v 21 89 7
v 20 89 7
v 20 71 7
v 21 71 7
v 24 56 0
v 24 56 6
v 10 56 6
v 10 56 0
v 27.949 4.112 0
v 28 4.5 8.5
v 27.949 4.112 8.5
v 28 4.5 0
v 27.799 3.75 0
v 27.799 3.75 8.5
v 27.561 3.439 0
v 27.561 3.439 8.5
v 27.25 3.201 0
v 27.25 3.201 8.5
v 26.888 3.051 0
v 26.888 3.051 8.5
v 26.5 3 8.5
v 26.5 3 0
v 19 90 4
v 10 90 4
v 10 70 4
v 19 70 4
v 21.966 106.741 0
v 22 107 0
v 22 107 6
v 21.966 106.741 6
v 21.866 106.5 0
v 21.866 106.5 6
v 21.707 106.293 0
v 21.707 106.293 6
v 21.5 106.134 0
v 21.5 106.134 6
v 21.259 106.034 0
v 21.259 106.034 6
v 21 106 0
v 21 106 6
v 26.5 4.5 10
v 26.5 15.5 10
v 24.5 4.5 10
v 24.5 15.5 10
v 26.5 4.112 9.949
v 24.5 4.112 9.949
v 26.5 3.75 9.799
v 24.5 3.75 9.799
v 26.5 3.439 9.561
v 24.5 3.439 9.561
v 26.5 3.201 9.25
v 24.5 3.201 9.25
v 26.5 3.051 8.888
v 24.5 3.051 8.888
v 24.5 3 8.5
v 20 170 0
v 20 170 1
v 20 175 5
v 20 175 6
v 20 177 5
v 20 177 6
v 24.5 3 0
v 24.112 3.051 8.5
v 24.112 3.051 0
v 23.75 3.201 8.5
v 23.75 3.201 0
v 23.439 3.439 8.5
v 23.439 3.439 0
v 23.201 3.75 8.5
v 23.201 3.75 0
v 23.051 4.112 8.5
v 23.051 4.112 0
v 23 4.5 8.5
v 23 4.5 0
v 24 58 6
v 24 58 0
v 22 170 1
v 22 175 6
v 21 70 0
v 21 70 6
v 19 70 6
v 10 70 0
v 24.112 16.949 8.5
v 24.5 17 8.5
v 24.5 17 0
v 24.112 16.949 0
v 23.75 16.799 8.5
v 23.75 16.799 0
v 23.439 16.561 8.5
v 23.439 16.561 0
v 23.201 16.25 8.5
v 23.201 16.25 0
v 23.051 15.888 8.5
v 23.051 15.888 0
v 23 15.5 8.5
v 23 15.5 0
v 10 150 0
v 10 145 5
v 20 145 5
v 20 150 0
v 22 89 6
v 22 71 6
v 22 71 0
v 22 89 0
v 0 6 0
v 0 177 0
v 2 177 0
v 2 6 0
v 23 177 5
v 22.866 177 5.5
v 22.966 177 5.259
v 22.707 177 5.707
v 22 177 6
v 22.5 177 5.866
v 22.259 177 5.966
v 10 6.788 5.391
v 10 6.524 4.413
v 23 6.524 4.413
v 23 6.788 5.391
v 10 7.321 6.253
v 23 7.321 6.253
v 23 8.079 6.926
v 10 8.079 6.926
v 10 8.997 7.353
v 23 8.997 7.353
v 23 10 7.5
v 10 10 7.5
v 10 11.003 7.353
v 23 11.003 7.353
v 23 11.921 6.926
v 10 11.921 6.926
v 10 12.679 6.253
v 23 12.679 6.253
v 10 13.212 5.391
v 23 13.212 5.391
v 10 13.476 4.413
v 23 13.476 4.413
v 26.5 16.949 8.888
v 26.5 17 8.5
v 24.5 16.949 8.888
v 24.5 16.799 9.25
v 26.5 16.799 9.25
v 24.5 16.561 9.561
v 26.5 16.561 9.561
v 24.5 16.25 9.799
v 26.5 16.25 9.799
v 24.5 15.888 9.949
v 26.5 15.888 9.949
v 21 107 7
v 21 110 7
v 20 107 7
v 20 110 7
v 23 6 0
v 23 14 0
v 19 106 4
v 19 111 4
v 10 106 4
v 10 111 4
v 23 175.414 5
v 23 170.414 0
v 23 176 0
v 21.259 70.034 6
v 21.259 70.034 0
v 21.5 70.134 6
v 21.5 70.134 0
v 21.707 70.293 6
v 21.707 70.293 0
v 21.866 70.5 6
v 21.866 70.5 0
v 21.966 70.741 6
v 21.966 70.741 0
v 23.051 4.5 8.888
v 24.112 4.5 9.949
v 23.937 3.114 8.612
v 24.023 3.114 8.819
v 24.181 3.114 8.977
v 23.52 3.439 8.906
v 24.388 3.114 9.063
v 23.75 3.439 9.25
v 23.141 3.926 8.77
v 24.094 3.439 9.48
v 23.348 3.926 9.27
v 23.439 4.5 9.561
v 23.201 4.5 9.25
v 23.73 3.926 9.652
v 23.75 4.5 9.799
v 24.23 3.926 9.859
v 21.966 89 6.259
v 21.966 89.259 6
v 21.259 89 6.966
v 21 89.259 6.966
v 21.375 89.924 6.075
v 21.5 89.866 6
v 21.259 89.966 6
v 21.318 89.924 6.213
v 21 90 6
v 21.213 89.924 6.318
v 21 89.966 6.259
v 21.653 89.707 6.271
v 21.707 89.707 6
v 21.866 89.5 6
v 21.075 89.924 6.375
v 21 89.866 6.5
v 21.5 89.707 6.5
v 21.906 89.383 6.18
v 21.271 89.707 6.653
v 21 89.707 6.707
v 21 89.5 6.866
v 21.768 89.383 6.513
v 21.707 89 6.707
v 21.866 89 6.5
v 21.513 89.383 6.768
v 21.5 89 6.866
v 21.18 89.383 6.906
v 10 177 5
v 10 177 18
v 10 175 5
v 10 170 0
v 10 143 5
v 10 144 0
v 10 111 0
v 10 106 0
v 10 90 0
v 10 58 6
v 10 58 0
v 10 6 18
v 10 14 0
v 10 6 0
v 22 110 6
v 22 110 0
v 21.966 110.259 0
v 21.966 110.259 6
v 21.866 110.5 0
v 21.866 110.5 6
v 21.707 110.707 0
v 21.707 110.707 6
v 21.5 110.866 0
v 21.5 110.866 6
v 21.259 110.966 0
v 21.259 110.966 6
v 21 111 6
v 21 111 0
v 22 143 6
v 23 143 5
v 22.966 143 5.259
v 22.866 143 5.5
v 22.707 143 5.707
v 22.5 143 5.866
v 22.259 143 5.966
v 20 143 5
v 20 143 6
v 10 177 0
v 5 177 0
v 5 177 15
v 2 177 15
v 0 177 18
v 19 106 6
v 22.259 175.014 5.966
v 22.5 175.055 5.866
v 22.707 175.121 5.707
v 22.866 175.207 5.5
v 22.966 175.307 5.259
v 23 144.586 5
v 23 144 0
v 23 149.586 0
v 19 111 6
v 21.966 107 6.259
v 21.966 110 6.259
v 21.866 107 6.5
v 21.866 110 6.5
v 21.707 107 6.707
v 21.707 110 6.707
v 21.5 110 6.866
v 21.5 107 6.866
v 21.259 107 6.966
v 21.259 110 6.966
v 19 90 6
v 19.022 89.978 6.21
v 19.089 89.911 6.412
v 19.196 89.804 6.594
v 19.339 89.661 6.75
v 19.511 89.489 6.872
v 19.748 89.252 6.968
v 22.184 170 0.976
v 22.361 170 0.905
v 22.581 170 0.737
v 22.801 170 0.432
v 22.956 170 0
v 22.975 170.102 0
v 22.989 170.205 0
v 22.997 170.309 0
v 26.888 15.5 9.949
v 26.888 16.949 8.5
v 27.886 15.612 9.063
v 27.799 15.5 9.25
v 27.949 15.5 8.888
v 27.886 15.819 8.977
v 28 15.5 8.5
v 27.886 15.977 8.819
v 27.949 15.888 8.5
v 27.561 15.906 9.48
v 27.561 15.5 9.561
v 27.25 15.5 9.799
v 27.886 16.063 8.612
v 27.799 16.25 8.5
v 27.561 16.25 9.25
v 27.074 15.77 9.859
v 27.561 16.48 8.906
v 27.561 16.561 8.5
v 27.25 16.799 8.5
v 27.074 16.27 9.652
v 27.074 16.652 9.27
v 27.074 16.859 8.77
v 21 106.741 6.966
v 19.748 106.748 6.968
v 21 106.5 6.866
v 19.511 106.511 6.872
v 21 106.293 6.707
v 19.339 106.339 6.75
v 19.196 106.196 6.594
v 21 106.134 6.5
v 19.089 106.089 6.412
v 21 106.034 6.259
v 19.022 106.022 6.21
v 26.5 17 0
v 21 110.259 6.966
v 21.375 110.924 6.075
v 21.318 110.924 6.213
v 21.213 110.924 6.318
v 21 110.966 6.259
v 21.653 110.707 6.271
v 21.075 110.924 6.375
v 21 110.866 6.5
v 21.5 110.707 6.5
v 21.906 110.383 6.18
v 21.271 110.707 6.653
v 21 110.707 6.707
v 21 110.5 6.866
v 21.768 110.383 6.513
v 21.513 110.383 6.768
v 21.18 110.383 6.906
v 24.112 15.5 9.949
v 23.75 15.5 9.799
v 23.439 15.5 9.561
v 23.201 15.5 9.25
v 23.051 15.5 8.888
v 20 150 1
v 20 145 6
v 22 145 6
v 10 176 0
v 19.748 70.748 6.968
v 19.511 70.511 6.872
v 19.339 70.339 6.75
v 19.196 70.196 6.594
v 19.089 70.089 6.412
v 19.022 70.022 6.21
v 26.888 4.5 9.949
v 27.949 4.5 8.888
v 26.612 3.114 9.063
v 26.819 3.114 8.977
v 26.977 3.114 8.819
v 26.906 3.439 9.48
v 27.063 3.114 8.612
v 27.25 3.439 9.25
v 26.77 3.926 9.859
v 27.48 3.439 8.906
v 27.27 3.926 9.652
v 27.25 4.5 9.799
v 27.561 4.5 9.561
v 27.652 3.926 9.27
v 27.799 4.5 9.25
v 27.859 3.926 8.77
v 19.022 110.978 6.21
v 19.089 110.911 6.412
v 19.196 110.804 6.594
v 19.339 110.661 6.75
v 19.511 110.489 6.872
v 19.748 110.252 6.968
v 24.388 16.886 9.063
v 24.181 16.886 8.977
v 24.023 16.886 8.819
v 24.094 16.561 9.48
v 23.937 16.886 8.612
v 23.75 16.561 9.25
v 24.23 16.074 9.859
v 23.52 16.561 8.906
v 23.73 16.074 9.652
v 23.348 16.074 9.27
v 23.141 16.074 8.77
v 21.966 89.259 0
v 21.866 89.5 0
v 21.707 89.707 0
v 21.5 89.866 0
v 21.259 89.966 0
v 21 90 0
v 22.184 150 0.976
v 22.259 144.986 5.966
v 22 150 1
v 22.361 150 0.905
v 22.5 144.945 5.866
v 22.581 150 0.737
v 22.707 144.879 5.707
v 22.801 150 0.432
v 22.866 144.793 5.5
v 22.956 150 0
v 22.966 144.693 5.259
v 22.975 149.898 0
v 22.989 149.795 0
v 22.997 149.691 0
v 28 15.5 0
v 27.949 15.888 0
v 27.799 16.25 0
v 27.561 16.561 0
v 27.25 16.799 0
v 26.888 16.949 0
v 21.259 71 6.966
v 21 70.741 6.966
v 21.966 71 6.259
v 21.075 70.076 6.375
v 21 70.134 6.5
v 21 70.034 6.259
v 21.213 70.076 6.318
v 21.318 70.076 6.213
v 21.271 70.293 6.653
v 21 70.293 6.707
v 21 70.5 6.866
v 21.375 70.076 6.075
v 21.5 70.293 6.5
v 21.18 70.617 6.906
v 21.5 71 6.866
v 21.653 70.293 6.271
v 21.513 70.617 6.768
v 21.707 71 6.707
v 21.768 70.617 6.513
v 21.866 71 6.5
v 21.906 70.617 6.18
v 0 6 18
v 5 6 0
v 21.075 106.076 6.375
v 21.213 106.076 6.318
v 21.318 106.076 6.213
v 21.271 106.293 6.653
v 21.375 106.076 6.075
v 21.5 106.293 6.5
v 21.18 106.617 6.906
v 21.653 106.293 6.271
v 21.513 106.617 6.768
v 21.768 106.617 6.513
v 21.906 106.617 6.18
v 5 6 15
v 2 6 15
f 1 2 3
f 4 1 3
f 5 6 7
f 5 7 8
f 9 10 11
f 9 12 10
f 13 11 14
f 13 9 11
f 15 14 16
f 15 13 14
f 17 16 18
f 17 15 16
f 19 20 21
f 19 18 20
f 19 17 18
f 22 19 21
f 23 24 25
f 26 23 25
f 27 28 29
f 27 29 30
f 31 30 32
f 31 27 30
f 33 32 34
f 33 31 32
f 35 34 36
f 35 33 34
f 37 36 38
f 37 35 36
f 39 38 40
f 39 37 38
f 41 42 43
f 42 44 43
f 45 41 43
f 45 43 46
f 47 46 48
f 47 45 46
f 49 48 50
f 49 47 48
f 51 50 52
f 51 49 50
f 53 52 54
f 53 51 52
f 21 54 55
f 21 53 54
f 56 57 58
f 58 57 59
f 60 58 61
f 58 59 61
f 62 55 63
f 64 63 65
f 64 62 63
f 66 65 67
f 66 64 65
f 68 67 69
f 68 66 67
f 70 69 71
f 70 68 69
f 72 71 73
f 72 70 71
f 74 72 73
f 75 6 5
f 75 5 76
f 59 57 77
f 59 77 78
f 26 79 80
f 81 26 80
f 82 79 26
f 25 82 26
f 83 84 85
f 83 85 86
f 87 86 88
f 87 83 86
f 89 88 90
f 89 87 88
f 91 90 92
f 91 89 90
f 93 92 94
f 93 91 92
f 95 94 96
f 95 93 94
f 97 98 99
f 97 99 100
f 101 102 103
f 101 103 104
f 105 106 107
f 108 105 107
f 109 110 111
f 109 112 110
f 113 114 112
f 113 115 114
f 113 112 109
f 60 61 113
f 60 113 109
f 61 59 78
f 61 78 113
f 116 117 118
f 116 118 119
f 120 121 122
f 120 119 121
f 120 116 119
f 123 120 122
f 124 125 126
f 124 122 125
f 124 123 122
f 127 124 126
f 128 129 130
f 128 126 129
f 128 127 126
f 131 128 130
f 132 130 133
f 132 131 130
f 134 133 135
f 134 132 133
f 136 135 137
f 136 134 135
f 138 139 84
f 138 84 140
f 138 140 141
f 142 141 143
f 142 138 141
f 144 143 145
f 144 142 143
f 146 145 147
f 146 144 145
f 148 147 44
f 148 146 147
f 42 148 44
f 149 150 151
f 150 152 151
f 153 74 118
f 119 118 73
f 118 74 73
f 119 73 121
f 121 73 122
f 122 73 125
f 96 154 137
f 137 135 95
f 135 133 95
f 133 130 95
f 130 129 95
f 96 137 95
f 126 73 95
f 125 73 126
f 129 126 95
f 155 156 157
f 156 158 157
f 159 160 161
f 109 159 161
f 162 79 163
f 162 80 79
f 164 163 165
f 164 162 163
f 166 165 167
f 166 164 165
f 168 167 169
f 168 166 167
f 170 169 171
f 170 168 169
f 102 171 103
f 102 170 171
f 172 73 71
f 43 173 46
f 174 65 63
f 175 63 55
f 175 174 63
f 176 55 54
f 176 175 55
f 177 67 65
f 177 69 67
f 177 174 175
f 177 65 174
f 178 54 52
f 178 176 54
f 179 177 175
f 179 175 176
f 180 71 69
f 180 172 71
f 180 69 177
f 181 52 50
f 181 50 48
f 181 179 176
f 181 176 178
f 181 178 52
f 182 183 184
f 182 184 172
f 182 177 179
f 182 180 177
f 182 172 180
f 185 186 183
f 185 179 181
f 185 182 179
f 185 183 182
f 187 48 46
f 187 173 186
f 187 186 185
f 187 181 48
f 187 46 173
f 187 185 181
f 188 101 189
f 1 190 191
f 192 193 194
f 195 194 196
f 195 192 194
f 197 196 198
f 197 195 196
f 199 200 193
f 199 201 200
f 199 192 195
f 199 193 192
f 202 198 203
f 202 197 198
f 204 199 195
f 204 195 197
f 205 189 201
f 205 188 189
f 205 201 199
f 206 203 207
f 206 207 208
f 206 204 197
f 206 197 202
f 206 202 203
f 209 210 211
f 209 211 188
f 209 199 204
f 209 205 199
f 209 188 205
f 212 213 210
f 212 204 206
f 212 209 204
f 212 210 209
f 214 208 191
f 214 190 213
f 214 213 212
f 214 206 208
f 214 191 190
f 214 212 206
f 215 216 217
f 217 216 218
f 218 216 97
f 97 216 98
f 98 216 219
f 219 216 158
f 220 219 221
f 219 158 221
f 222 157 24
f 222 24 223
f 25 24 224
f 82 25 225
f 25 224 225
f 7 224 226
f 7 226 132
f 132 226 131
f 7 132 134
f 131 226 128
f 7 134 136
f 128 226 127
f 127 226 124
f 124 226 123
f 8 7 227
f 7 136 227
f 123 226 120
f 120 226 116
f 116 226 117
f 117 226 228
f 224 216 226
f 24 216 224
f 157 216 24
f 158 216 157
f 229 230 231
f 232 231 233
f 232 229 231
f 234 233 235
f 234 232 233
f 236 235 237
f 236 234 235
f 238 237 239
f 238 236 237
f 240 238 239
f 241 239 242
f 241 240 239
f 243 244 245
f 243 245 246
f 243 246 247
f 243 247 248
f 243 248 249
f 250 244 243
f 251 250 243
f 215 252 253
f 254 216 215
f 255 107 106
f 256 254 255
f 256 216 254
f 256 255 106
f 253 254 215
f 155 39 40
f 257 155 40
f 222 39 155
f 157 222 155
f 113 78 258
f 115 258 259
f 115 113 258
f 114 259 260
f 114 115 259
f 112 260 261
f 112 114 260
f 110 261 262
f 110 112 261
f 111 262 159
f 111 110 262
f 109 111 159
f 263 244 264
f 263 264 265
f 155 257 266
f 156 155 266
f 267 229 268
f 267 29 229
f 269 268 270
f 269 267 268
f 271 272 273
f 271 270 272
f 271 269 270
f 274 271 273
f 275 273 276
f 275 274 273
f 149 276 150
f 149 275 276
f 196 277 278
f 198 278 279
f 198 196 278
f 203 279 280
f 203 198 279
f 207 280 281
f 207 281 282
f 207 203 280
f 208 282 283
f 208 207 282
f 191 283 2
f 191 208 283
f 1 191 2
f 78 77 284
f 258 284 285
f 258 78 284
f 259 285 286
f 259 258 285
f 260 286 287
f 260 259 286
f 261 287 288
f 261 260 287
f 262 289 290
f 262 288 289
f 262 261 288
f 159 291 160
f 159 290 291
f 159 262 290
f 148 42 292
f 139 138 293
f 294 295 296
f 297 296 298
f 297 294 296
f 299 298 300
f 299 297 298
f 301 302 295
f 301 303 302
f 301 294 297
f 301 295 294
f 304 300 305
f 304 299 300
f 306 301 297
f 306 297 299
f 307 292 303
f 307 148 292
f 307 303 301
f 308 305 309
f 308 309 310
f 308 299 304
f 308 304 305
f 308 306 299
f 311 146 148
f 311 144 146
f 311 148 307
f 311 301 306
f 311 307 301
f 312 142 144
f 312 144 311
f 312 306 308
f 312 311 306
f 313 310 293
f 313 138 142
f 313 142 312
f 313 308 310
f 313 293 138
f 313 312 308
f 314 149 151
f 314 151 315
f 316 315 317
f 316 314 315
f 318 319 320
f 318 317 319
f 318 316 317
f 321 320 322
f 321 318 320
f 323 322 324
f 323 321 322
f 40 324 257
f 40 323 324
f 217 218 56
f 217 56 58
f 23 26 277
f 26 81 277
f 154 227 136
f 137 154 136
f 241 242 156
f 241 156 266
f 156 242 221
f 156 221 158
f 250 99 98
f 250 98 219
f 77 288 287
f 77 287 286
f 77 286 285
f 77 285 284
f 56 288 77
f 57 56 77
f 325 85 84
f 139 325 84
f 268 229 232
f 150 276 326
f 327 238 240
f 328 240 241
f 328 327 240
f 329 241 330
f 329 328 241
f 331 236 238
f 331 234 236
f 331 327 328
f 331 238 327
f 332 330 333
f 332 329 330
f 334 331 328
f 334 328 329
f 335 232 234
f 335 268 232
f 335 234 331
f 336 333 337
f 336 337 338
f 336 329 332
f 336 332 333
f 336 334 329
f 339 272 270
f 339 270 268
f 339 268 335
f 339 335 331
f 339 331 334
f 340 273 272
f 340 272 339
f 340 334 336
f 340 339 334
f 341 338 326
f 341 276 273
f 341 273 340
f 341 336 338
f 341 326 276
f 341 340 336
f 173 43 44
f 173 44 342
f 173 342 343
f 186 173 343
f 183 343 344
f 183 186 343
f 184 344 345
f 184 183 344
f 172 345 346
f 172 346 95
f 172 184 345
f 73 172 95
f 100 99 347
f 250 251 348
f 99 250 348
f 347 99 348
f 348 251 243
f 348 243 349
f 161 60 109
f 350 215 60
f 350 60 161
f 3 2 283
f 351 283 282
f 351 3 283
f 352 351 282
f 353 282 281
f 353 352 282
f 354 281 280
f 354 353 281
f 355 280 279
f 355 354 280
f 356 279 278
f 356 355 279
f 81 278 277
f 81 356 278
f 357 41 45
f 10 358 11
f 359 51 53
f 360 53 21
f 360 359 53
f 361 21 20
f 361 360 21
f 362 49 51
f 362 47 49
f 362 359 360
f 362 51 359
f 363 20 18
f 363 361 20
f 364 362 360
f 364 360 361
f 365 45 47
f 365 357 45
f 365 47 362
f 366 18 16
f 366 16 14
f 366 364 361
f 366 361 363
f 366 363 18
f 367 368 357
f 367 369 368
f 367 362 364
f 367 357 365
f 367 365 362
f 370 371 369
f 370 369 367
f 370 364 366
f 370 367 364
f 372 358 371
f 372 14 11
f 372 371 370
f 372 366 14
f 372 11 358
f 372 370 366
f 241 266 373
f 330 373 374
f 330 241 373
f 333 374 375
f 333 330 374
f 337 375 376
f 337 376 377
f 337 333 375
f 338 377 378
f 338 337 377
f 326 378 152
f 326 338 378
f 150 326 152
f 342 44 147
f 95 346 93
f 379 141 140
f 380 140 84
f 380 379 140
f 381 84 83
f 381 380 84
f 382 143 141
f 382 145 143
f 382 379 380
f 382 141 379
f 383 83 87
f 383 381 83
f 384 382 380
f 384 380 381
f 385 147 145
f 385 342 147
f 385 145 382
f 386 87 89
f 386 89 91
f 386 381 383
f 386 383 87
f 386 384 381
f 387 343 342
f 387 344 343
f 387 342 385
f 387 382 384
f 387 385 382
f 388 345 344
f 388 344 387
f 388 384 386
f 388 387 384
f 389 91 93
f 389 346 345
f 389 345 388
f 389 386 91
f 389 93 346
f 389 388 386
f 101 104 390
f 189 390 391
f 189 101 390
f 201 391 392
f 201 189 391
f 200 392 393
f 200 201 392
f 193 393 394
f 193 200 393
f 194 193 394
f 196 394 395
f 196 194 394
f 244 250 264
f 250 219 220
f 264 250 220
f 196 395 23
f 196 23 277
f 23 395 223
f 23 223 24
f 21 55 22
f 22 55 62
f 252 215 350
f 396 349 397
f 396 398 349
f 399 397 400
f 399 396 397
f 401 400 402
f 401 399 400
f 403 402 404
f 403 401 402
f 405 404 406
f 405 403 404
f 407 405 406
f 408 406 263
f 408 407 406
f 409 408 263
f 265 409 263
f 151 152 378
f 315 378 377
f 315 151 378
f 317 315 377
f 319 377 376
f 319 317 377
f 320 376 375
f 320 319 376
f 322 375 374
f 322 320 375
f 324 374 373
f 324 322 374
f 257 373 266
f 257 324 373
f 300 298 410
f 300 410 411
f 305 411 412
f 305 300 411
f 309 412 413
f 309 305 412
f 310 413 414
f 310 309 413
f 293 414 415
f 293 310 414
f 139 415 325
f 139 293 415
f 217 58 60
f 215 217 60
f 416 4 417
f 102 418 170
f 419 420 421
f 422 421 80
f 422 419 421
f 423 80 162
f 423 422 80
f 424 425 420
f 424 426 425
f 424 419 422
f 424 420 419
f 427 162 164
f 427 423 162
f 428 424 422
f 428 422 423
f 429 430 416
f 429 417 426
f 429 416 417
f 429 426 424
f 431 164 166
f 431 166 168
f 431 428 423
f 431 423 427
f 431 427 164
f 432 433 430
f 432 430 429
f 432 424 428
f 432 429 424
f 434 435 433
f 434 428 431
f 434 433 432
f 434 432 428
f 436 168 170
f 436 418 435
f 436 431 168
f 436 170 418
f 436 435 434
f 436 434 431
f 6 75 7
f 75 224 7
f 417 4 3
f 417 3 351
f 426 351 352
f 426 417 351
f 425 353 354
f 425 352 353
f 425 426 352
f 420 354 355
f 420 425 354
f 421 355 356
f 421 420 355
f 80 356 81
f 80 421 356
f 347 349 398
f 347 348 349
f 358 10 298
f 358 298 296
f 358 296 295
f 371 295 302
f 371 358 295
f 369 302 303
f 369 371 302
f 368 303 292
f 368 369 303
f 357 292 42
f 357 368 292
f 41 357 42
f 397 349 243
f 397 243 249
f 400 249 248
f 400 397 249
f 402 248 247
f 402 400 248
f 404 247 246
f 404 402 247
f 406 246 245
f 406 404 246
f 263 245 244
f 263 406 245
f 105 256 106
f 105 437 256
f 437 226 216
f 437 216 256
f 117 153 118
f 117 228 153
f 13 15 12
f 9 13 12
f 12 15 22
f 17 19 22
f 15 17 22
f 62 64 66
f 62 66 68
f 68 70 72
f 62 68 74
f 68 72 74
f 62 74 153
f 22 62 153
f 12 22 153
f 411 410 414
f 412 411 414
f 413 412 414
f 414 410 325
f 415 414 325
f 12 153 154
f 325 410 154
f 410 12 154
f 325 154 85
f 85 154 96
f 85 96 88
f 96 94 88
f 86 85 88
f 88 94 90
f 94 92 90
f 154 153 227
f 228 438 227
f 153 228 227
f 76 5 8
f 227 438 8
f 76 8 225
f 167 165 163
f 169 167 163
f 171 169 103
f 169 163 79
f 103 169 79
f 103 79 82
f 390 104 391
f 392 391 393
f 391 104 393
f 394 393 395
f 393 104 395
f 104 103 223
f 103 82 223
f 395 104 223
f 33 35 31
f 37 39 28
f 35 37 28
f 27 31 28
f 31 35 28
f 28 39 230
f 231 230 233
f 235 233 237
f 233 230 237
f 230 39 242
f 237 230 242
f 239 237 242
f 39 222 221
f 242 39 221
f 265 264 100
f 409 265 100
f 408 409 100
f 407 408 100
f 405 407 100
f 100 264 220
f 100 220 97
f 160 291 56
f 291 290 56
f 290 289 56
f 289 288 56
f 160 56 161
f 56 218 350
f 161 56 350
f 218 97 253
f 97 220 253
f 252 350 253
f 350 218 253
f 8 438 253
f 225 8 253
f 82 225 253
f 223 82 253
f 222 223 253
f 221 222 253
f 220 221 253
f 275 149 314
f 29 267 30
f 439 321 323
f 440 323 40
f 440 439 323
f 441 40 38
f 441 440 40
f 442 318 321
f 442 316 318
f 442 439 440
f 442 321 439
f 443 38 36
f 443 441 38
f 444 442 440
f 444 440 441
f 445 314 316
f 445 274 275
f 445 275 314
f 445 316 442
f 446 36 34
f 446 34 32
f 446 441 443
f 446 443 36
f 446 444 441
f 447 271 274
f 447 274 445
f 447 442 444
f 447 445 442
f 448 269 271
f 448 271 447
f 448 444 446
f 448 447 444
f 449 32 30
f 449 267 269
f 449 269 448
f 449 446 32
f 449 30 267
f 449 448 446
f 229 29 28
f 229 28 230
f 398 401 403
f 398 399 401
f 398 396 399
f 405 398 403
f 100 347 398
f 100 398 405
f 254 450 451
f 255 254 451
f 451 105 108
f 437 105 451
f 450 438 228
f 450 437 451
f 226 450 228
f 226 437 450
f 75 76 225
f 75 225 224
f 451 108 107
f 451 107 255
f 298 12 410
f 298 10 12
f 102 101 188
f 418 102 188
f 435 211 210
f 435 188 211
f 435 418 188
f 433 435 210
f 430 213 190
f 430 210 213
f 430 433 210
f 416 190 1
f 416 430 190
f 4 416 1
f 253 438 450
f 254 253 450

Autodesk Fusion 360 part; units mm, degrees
sketch "Schizzo2" plane through (0, 0, 0) normal (0, 1, 0) x (1, 0, 0)
  line L0 (0, 0) -> (2, 0)
  line L1 (2, 0) -> (2, -30)
  line L2 (2, -30) -> (0, -30)
  line L3 (0, -30) -> (0, 0)
  line L4 (2, -30) -> (5, -30)
  line L5 (5, -30) -> (5, -15)
  line L6 (5, -15) -> (2, -15)
  line L7 (2, -15) -> (2, -30)
  line L8 (5, -30) -> (10, -30)
  line L9 (10, -30) -> (10, 0)
  line L10 (10, 0) -> (5, 0)
  line L11 (5, 0) -> (5, -30)
  dimension "d1" = 2
  dimension "d2" = 30
  dimension "d3" = 3
  dimension "d4" = 30
  dimension "d5" = 5
  dimension "d44" = 15
extrude "Estrusione1" add sketch "Schizzo2" along normal blind 200
sketch "Schizzo3" plane through (10, 0, 0) normal (1, 0, 0) x (0, 1, 0)
  line L0 (0, 30) -> (0, 0)
  line L1 (0, 0) -> (200, 0)
  line L2 (200, 0) -> (200, 30)
  line L3 (200, 30) -> (0, 30)
  line L4 (0, 30) -> (10, 30)
  circle A0 centre (10, 4) radius 3.5
  line L5 (6, 0) -> (6.5245, 4.413)
  line L6 (14, 0) -> (13.4755, 4.413)
  line L7 (6, 0) -> (14, 0)
  dimension "d8" = 7
extrude "Estrusione2" add sketch "Schizzo3" along normal blind 13 contours L1 A0 L5 L6 L7 | A0
sketch "Schizzo4" plane through (23, 0, 0) normal (1, 0, 0) x (0, 1, 0)
  line L0 (3, 0) -> (17, 0)
  line L1 (17, 0) -> (17, 10)
  line L2 (17, 10) -> (3, 10)
  line L3 (3, 10) -> (3, 0)
extrude "Estrusione4" add sketch "Schizzo4" along normal blind 5
fillet "Raccordo3" radius 1.5 8 edges at (23, 10, 10) (25.5, 17, 10) (28, 10, 10) (25.5, 3, 10) (28, 3, 5) (23, 3, 5) (28, 17, 5) (23, 17, 5)
sketch "Schizzo5" plane through (10, 0, 0) normal (1, 0, 0) x (0, 1, 0)
  line L0 (13.4755, 4.413) -> (14, 0)
  line L1 (14, 0) -> (200, 0)
  line L2 (200, 0) -> (200, 30)
  line L3 (200, 30) -> (0, 30)
  line L4 (0, 30) -> (0, 0)
  line L5 (0, 0) -> (6, 0)
  line L6 (6, 0) -> (6.5245, 4.413)
  arc A0 (13.4755, 4.413) -> (6.5245, 4.413) centre (10, 4) ccw
sketch "Schizzo6" plane through (10, 0, 0) normal (1, 0, 0) x (0, 1, 0)
  line L0 (70, 0) -> (70, 4)
  line L1 (70, 0) -> (90, 0)
  line L2 (90, 0) -> (106, 0)
  line L3 (106, 0) -> (111, 0)
  line L4 (111, 0) -> (111, 4)
  line L5 (90, 0) -> (90, 4)
  line L6 (106, 0) -> (106, 4)
  line L7 (111, 4) -> (106, 4)
  line L8 (90, 4) -> (70, 4)
  dimension "d22" = 20
  dimension "d23" = 16
  dimension "d24" = 5
extrude "Estrusione5" add sketch "Schizzo6" along normal blind 9
sketch "Schizzo7" plane through (19, 0, 0) normal (1, 0, 0) x (0, 1, 0)
  line L0 (70, 0) -> (90, 0)
  line L1 (90, 0) -> (90, 4)
  line L2 (90, 4) -> (70, 4)
  line L3 (70, 4) -> (70, 0)
  line L4 (70, 0) -> (90, 0)
  line L5 (90, 0) -> (90, 7)
  line L6 (90, 7) -> (70, 7)
  line L7 (70, 7) -> (70, 0)
  line L8 (106, 0) -> (111, 0)
  line L9 (111, 0) -> (111, 7)
  line L10 (111, 7) -> (106, 7)
  line L11 (106, 7) -> (106, 0)
extrude "Estrusione6" add sketch "Schizzo7" along normal blind 3
fillet "Raccordo4" radius 1 12 edges at (19, 108.5, 7) (22, 108.5, 7) (22, 80, 7) (19, 80, 7) (20.5, 90, 7) (20.5, 106, 7) (20.5, 111, 7) (22, 106, 3.5) (22, 111, 3.5) (22, 90, 3.5) (20.5, 70, 7) (22, 70, 3.5)
sketch "Schizzo8" plane through (10, 0, 0) normal (1, 0, 0) x (0, 1, 0)
  line L0 (150, 0) -> (150, 10)
  line L1 (150, 0) -> (170, 0)
  line L2 (170, 0) -> (175, 5)
  line L3 (145, 5) -> (150, 0)
  line L4 (145, 5) -> (143, 5)
  line L5 (148, 0) -> (150, 0)
  line L6 (175, 5) -> (177, 5)
  line L7 (170, 0) -> (172, 0)
  line L8 (143, 5) -> (144, 0)
  line L9 (144, 0) -> (148, 0)
  line L10 (177, 5) -> (176, 0)
  line L11 (176, 0) -> (172, 0)
  dimension "d31" = 20
extrude "Estrusione8" add sketch "Schizzo8" along normal blind 10
sketch "Schizzo9" plane through (20, 0, 0) normal (1, 0, 0) x (0, 1, 0)
  line L0 (170, 0) -> (176, 0)
  line L1 (176, 0) -> (177, 5)
  line L2 (177, 5) -> (175, 5)
  line L3 (175, 5) -> (170, 0)
  line L4 (143, 5) -> (143, 6)
  line L5 (143, 6) -> (145, 6)
  line L6 (145, 6) -> (150, 1)
  line L7 (150, 1) -> (150, 0)
  line L8 (143, 5) -> (144, 0)
  line L9 (144, 0) -> (150, 0)
  line L10 (170, 0) -> (170, 1)
  line L11 (170, 1) -> (175, 6)
  line L12 (175, 6) -> (177, 6)
  line L13 (177, 6) -> (177, 5)
  line L14 (176, 0) -> (177, 5)
  line L15 (170, 0) -> (176, 0)
extrude "Estrusione9" add sketch "Schizzo9" along normal blind 3
fillet "Raccordo5" radius 1 4 edges at (23, 144, 6) (23, 147.5, 3.5) (23, 176, 6) (23, 172.5, 3.5)
sketch "Schizzo10" plane through (0, 200, 0) normal (0, 1, 0) x (-1, 0, 0)
  line L0 (0, 30) -> (-10, 30)
  line L1 (-10, 30) -> (-10, 0)
  line L2 (-10, 0) -> (-5, 0)
  line L3 (-5, 0) -> (-5, 15)
  line L4 (-5, 15) -> (-2, 15)
  line L5 (-2, 15) -> (-2, 0)
  line L6 (-2, 0) -> (0, 0)
  line L7 (0, 0) -> (0, 30)
  line L8 (-12, 31) -> (4, 31)
  line L9 (4, 31) -> (4, -5)
  line L10 (4, -5) -> (-12, -5)
  line L11 (-12, -5) -> (-12, 31)
extrude "Estrusione10" cut sketch "Schizzo10" against normal blind 23 contours L0 L1 L2 L3 L4 L5 L6 L7 | L8 L9 L10 L11
sketch "Schizzo11" plane through (0, 0, 0) normal (0, -1, 0) x (1, 0, 0)
  line L0 (10, 30) -> (0, 30)
  line L1 (0, 30) -> (0, 0)
  line L2 (0, 0) -> (2, 0)
  line L3 (2, 0) -> (2, 15)
  line L4 (2, 15) -> (5, 15)
  line L5 (5, 15) -> (5, 0)
  line L6 (5, 0) -> (10, 0)
  line L7 (10, 0) -> (10, 30)
  line L8 (-2, 31) -> (12, 31)
  line L9 (12, 31) -> (12, -1)
  line L10 (12, -1) -> (-2, -1)
  line L11 (-2, -1) -> (-2, 31)
extrude "Estrusione11" cut sketch "Schizzo11" against normal blind 6 contours L0 L1 L2 L3 L4 L5 L6 L7
sketch "Schizzo12" plane through (0, 6, 0) normal (0, -1, 0) x (1, 0, 0)
  line L0 (10, 0) -> (10, 30)
  line L1 (10, 30) -> (0, 30)
  line L2 (0, 30) -> (0, 0)
  line L3 (0, 0) -> (2, 0)
  line L4 (2, 0) -> (2, 15)
  line L5 (2, 15) -> (5, 15)
  line L6 (5, 15) -> (5, 0)
  line L7 (5, 0) -> (10, 0)
  line L8 (-2, 31) -> (11, 31)
  line L9 (11, 31) -> (11, 18)
  line L10 (11, 18) -> (-2, 18)
  line L11 (-2, 18) -> (-2, 31)
  dimension "d45" = 13
extrude "Estrusione12" cut sketch "Schizzo12" against normal blind 175 contours L0 L1 L2 L10
sketch "Schizzo13" plane through (0, 0, 0) normal (-1, 0, 0) x (0, -1, 0)
  line L0 (-6, 18) -> (-177, 18)
  line L1 (-177, 18) -> (-177, 0)
  line L2 (-177, 0) -> (-6, 0)
  line L3 (-6, 0) -> (-6, 18)
  line L4 (-177, 18) -> (-6, 18)
  line L5 (-6, 18) -> (-6, 0)
  line L6 (-6, 0) -> (-177, 0)
  line L7 (-177, 0) -> (-177, 18)
sketch "Schizzo14" plane through (10, 0, 0) normal (1, 0, 0) x (0, 1, 0)
  line L0 (56, 0) -> (58, 0)
  line L1 (58, 0) -> (58, 6)
  line L2 (58, 6) -> (56, 6)
  line L3 (56, 6) -> (56, 0)
  line L4 (70, 6) -> (70, 0)
  dimension "d48" = 12
  dimension "d49" = 2
  dimension "d50" = 6
extrude "Estrusione13" add sketch "Schizzo14" along normal blind 14
